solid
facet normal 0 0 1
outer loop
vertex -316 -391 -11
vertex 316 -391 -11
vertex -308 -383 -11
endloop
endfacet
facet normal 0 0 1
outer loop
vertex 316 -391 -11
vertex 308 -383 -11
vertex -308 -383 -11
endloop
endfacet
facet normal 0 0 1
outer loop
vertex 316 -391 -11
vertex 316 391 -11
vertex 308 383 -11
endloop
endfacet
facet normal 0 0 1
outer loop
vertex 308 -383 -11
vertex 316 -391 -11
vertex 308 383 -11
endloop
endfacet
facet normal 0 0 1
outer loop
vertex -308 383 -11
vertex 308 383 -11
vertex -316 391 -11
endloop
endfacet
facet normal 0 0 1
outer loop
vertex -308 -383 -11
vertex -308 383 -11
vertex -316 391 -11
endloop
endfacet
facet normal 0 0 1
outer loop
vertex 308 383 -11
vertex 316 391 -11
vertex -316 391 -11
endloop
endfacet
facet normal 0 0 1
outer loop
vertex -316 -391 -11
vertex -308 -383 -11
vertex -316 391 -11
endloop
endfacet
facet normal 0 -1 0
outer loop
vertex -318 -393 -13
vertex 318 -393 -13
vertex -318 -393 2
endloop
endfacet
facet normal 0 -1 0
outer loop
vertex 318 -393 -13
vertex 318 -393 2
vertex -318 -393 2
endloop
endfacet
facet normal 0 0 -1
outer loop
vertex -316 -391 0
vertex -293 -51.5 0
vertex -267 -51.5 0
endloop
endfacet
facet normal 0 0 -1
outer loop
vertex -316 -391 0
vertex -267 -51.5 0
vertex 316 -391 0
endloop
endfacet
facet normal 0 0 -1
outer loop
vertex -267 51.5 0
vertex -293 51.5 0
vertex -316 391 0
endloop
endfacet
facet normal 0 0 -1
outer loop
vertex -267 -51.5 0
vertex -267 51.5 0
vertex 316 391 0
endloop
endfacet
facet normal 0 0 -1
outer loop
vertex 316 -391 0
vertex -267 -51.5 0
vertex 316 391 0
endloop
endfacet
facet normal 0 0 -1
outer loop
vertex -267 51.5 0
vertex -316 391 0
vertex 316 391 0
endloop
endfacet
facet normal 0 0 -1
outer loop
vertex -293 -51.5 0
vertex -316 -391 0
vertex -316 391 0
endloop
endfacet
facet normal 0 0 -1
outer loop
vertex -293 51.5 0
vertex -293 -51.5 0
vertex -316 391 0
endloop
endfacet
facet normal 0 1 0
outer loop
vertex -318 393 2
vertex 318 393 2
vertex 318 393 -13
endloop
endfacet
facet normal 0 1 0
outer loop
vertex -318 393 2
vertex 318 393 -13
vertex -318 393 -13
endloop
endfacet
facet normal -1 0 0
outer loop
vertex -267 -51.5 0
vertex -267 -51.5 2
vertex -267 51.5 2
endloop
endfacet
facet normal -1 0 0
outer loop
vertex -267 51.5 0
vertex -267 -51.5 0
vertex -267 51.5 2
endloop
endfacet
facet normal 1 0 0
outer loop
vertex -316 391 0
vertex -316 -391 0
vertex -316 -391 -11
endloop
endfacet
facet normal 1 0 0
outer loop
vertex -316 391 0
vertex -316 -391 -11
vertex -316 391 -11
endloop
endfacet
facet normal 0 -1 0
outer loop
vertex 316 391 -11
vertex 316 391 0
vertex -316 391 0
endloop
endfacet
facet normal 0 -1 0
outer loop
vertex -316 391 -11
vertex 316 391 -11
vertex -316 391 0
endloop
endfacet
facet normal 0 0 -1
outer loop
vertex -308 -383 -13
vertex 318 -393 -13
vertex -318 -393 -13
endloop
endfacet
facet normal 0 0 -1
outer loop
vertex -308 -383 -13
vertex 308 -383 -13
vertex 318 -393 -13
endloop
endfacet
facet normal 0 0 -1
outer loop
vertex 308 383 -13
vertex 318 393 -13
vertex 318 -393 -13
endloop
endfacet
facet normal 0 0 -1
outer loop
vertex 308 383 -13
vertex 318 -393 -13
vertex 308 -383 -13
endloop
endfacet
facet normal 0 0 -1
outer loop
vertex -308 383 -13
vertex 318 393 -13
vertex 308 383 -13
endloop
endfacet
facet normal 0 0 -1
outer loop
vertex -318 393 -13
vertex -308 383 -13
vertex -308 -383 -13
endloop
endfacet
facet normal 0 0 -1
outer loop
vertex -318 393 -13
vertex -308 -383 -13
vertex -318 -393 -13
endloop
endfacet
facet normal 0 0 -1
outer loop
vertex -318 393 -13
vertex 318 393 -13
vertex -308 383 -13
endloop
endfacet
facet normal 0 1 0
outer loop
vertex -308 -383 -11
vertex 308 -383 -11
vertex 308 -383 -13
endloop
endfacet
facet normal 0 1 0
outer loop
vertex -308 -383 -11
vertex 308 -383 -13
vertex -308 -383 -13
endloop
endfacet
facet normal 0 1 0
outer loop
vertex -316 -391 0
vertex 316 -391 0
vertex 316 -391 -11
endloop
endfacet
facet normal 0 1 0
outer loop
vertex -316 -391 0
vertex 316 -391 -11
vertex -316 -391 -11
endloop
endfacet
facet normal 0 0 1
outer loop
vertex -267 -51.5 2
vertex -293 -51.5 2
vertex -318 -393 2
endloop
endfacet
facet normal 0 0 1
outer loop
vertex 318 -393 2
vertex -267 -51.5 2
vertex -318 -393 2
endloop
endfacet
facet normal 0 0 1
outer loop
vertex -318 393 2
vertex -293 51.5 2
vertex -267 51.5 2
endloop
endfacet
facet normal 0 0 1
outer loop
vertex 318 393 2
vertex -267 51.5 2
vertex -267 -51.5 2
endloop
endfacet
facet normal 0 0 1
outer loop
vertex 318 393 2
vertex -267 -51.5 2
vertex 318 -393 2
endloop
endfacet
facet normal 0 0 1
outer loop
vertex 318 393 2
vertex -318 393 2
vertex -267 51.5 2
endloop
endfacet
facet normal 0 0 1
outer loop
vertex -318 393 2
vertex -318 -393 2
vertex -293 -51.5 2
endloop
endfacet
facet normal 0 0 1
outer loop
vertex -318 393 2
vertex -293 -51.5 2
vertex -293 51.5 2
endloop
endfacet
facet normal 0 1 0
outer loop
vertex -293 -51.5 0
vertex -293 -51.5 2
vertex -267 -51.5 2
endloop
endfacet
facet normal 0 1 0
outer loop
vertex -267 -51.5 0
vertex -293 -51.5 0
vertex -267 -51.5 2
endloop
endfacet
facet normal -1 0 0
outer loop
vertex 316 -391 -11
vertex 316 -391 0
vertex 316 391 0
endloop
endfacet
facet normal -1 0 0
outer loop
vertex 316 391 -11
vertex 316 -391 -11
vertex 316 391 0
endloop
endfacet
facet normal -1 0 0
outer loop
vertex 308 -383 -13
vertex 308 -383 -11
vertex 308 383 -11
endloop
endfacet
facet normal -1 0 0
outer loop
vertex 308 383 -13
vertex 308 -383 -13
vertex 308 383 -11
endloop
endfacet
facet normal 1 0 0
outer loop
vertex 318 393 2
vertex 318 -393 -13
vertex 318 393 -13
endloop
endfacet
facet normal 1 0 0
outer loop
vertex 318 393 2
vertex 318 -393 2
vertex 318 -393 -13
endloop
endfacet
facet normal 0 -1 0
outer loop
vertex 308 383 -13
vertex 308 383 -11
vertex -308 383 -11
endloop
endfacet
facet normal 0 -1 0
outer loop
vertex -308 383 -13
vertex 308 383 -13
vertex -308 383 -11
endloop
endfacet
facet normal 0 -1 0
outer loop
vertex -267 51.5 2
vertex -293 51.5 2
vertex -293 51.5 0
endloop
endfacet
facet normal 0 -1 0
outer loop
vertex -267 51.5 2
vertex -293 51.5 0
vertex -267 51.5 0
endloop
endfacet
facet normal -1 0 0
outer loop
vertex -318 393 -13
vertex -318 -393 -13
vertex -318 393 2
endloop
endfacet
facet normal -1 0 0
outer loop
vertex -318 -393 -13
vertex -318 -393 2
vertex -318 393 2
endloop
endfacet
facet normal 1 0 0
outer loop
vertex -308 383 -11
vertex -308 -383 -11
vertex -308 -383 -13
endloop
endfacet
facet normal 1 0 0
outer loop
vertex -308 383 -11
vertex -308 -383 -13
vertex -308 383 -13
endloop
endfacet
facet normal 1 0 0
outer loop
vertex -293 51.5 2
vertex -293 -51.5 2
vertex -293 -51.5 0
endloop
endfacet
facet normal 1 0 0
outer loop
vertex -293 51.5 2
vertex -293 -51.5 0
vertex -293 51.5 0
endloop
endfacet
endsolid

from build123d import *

# Parameters (mm, degrees)
SKETCH_1_W          = 636
SKETCH_1_H          = 786
EXTRUDE_1_DEPTH     = 2
SKETCH_2_W          = 636
SKETCH_2_H          = 786
SKETCH_2_W_2        = 632
SKETCH_2_H_2        = 782
EXTRUDE_2_DEPTH     = 11
SKETCH_3_W          = 636
SKETCH_3_H          = 786
SKETCH_3_W_2        = 616
SKETCH_3_H_2        = 766
EXTRUDE_3_DEPTH     = 2
SKETCH_4_W          = 26
SKETCH_4_H          = 103
CUT_EXTRUDE_1_DEPTH = 10


with BuildPart() as part:
    # 草图1 → 凸台-拉伸1 (new body)
    with BuildSketch(Plane.XY):
        Rectangle(SKETCH_1_W, SKETCH_1_H)
    extrude(amount=EXTRUDE_1_DEPTH)

    # 草图2 → 凸台-拉伸2 (add)
    with BuildSketch(Plane(origin=(0, 0, 0), x_dir=(-1, 0, 0), z_dir=(0, 0, -1))):
        Rectangle(SKETCH_2_W, SKETCH_2_H)
        Rectangle(SKETCH_2_W_2, SKETCH_2_H_2, mode=Mode.SUBTRACT)
    extrude(amount=EXTRUDE_2_DEPTH)

    # 草图3 → 凸台-拉伸3 (add)
    with BuildSketch(Plane(origin=(0, 0, -11), x_dir=(-1, 0, 0), z_dir=(0, 0, -1))):
        Rectangle(SKETCH_3_W, SKETCH_3_H)
        Rectangle(SKETCH_3_W_2, SKETCH_3_H_2, mode=Mode.SUBTRACT)
    extrude(amount=EXTRUDE_3_DEPTH)

    # 草图4 → 切除-拉伸1 (cut)
    with BuildSketch(Plane.XY.offset(2)):
        with Locations((-280, 0)):
            Rectangle(SKETCH_4_W, SKETCH_4_H)
    extrude(amount=-CUT_EXTRUDE_1_DEPTH, mode=Mode.SUBTRACT)


solid = part.part
